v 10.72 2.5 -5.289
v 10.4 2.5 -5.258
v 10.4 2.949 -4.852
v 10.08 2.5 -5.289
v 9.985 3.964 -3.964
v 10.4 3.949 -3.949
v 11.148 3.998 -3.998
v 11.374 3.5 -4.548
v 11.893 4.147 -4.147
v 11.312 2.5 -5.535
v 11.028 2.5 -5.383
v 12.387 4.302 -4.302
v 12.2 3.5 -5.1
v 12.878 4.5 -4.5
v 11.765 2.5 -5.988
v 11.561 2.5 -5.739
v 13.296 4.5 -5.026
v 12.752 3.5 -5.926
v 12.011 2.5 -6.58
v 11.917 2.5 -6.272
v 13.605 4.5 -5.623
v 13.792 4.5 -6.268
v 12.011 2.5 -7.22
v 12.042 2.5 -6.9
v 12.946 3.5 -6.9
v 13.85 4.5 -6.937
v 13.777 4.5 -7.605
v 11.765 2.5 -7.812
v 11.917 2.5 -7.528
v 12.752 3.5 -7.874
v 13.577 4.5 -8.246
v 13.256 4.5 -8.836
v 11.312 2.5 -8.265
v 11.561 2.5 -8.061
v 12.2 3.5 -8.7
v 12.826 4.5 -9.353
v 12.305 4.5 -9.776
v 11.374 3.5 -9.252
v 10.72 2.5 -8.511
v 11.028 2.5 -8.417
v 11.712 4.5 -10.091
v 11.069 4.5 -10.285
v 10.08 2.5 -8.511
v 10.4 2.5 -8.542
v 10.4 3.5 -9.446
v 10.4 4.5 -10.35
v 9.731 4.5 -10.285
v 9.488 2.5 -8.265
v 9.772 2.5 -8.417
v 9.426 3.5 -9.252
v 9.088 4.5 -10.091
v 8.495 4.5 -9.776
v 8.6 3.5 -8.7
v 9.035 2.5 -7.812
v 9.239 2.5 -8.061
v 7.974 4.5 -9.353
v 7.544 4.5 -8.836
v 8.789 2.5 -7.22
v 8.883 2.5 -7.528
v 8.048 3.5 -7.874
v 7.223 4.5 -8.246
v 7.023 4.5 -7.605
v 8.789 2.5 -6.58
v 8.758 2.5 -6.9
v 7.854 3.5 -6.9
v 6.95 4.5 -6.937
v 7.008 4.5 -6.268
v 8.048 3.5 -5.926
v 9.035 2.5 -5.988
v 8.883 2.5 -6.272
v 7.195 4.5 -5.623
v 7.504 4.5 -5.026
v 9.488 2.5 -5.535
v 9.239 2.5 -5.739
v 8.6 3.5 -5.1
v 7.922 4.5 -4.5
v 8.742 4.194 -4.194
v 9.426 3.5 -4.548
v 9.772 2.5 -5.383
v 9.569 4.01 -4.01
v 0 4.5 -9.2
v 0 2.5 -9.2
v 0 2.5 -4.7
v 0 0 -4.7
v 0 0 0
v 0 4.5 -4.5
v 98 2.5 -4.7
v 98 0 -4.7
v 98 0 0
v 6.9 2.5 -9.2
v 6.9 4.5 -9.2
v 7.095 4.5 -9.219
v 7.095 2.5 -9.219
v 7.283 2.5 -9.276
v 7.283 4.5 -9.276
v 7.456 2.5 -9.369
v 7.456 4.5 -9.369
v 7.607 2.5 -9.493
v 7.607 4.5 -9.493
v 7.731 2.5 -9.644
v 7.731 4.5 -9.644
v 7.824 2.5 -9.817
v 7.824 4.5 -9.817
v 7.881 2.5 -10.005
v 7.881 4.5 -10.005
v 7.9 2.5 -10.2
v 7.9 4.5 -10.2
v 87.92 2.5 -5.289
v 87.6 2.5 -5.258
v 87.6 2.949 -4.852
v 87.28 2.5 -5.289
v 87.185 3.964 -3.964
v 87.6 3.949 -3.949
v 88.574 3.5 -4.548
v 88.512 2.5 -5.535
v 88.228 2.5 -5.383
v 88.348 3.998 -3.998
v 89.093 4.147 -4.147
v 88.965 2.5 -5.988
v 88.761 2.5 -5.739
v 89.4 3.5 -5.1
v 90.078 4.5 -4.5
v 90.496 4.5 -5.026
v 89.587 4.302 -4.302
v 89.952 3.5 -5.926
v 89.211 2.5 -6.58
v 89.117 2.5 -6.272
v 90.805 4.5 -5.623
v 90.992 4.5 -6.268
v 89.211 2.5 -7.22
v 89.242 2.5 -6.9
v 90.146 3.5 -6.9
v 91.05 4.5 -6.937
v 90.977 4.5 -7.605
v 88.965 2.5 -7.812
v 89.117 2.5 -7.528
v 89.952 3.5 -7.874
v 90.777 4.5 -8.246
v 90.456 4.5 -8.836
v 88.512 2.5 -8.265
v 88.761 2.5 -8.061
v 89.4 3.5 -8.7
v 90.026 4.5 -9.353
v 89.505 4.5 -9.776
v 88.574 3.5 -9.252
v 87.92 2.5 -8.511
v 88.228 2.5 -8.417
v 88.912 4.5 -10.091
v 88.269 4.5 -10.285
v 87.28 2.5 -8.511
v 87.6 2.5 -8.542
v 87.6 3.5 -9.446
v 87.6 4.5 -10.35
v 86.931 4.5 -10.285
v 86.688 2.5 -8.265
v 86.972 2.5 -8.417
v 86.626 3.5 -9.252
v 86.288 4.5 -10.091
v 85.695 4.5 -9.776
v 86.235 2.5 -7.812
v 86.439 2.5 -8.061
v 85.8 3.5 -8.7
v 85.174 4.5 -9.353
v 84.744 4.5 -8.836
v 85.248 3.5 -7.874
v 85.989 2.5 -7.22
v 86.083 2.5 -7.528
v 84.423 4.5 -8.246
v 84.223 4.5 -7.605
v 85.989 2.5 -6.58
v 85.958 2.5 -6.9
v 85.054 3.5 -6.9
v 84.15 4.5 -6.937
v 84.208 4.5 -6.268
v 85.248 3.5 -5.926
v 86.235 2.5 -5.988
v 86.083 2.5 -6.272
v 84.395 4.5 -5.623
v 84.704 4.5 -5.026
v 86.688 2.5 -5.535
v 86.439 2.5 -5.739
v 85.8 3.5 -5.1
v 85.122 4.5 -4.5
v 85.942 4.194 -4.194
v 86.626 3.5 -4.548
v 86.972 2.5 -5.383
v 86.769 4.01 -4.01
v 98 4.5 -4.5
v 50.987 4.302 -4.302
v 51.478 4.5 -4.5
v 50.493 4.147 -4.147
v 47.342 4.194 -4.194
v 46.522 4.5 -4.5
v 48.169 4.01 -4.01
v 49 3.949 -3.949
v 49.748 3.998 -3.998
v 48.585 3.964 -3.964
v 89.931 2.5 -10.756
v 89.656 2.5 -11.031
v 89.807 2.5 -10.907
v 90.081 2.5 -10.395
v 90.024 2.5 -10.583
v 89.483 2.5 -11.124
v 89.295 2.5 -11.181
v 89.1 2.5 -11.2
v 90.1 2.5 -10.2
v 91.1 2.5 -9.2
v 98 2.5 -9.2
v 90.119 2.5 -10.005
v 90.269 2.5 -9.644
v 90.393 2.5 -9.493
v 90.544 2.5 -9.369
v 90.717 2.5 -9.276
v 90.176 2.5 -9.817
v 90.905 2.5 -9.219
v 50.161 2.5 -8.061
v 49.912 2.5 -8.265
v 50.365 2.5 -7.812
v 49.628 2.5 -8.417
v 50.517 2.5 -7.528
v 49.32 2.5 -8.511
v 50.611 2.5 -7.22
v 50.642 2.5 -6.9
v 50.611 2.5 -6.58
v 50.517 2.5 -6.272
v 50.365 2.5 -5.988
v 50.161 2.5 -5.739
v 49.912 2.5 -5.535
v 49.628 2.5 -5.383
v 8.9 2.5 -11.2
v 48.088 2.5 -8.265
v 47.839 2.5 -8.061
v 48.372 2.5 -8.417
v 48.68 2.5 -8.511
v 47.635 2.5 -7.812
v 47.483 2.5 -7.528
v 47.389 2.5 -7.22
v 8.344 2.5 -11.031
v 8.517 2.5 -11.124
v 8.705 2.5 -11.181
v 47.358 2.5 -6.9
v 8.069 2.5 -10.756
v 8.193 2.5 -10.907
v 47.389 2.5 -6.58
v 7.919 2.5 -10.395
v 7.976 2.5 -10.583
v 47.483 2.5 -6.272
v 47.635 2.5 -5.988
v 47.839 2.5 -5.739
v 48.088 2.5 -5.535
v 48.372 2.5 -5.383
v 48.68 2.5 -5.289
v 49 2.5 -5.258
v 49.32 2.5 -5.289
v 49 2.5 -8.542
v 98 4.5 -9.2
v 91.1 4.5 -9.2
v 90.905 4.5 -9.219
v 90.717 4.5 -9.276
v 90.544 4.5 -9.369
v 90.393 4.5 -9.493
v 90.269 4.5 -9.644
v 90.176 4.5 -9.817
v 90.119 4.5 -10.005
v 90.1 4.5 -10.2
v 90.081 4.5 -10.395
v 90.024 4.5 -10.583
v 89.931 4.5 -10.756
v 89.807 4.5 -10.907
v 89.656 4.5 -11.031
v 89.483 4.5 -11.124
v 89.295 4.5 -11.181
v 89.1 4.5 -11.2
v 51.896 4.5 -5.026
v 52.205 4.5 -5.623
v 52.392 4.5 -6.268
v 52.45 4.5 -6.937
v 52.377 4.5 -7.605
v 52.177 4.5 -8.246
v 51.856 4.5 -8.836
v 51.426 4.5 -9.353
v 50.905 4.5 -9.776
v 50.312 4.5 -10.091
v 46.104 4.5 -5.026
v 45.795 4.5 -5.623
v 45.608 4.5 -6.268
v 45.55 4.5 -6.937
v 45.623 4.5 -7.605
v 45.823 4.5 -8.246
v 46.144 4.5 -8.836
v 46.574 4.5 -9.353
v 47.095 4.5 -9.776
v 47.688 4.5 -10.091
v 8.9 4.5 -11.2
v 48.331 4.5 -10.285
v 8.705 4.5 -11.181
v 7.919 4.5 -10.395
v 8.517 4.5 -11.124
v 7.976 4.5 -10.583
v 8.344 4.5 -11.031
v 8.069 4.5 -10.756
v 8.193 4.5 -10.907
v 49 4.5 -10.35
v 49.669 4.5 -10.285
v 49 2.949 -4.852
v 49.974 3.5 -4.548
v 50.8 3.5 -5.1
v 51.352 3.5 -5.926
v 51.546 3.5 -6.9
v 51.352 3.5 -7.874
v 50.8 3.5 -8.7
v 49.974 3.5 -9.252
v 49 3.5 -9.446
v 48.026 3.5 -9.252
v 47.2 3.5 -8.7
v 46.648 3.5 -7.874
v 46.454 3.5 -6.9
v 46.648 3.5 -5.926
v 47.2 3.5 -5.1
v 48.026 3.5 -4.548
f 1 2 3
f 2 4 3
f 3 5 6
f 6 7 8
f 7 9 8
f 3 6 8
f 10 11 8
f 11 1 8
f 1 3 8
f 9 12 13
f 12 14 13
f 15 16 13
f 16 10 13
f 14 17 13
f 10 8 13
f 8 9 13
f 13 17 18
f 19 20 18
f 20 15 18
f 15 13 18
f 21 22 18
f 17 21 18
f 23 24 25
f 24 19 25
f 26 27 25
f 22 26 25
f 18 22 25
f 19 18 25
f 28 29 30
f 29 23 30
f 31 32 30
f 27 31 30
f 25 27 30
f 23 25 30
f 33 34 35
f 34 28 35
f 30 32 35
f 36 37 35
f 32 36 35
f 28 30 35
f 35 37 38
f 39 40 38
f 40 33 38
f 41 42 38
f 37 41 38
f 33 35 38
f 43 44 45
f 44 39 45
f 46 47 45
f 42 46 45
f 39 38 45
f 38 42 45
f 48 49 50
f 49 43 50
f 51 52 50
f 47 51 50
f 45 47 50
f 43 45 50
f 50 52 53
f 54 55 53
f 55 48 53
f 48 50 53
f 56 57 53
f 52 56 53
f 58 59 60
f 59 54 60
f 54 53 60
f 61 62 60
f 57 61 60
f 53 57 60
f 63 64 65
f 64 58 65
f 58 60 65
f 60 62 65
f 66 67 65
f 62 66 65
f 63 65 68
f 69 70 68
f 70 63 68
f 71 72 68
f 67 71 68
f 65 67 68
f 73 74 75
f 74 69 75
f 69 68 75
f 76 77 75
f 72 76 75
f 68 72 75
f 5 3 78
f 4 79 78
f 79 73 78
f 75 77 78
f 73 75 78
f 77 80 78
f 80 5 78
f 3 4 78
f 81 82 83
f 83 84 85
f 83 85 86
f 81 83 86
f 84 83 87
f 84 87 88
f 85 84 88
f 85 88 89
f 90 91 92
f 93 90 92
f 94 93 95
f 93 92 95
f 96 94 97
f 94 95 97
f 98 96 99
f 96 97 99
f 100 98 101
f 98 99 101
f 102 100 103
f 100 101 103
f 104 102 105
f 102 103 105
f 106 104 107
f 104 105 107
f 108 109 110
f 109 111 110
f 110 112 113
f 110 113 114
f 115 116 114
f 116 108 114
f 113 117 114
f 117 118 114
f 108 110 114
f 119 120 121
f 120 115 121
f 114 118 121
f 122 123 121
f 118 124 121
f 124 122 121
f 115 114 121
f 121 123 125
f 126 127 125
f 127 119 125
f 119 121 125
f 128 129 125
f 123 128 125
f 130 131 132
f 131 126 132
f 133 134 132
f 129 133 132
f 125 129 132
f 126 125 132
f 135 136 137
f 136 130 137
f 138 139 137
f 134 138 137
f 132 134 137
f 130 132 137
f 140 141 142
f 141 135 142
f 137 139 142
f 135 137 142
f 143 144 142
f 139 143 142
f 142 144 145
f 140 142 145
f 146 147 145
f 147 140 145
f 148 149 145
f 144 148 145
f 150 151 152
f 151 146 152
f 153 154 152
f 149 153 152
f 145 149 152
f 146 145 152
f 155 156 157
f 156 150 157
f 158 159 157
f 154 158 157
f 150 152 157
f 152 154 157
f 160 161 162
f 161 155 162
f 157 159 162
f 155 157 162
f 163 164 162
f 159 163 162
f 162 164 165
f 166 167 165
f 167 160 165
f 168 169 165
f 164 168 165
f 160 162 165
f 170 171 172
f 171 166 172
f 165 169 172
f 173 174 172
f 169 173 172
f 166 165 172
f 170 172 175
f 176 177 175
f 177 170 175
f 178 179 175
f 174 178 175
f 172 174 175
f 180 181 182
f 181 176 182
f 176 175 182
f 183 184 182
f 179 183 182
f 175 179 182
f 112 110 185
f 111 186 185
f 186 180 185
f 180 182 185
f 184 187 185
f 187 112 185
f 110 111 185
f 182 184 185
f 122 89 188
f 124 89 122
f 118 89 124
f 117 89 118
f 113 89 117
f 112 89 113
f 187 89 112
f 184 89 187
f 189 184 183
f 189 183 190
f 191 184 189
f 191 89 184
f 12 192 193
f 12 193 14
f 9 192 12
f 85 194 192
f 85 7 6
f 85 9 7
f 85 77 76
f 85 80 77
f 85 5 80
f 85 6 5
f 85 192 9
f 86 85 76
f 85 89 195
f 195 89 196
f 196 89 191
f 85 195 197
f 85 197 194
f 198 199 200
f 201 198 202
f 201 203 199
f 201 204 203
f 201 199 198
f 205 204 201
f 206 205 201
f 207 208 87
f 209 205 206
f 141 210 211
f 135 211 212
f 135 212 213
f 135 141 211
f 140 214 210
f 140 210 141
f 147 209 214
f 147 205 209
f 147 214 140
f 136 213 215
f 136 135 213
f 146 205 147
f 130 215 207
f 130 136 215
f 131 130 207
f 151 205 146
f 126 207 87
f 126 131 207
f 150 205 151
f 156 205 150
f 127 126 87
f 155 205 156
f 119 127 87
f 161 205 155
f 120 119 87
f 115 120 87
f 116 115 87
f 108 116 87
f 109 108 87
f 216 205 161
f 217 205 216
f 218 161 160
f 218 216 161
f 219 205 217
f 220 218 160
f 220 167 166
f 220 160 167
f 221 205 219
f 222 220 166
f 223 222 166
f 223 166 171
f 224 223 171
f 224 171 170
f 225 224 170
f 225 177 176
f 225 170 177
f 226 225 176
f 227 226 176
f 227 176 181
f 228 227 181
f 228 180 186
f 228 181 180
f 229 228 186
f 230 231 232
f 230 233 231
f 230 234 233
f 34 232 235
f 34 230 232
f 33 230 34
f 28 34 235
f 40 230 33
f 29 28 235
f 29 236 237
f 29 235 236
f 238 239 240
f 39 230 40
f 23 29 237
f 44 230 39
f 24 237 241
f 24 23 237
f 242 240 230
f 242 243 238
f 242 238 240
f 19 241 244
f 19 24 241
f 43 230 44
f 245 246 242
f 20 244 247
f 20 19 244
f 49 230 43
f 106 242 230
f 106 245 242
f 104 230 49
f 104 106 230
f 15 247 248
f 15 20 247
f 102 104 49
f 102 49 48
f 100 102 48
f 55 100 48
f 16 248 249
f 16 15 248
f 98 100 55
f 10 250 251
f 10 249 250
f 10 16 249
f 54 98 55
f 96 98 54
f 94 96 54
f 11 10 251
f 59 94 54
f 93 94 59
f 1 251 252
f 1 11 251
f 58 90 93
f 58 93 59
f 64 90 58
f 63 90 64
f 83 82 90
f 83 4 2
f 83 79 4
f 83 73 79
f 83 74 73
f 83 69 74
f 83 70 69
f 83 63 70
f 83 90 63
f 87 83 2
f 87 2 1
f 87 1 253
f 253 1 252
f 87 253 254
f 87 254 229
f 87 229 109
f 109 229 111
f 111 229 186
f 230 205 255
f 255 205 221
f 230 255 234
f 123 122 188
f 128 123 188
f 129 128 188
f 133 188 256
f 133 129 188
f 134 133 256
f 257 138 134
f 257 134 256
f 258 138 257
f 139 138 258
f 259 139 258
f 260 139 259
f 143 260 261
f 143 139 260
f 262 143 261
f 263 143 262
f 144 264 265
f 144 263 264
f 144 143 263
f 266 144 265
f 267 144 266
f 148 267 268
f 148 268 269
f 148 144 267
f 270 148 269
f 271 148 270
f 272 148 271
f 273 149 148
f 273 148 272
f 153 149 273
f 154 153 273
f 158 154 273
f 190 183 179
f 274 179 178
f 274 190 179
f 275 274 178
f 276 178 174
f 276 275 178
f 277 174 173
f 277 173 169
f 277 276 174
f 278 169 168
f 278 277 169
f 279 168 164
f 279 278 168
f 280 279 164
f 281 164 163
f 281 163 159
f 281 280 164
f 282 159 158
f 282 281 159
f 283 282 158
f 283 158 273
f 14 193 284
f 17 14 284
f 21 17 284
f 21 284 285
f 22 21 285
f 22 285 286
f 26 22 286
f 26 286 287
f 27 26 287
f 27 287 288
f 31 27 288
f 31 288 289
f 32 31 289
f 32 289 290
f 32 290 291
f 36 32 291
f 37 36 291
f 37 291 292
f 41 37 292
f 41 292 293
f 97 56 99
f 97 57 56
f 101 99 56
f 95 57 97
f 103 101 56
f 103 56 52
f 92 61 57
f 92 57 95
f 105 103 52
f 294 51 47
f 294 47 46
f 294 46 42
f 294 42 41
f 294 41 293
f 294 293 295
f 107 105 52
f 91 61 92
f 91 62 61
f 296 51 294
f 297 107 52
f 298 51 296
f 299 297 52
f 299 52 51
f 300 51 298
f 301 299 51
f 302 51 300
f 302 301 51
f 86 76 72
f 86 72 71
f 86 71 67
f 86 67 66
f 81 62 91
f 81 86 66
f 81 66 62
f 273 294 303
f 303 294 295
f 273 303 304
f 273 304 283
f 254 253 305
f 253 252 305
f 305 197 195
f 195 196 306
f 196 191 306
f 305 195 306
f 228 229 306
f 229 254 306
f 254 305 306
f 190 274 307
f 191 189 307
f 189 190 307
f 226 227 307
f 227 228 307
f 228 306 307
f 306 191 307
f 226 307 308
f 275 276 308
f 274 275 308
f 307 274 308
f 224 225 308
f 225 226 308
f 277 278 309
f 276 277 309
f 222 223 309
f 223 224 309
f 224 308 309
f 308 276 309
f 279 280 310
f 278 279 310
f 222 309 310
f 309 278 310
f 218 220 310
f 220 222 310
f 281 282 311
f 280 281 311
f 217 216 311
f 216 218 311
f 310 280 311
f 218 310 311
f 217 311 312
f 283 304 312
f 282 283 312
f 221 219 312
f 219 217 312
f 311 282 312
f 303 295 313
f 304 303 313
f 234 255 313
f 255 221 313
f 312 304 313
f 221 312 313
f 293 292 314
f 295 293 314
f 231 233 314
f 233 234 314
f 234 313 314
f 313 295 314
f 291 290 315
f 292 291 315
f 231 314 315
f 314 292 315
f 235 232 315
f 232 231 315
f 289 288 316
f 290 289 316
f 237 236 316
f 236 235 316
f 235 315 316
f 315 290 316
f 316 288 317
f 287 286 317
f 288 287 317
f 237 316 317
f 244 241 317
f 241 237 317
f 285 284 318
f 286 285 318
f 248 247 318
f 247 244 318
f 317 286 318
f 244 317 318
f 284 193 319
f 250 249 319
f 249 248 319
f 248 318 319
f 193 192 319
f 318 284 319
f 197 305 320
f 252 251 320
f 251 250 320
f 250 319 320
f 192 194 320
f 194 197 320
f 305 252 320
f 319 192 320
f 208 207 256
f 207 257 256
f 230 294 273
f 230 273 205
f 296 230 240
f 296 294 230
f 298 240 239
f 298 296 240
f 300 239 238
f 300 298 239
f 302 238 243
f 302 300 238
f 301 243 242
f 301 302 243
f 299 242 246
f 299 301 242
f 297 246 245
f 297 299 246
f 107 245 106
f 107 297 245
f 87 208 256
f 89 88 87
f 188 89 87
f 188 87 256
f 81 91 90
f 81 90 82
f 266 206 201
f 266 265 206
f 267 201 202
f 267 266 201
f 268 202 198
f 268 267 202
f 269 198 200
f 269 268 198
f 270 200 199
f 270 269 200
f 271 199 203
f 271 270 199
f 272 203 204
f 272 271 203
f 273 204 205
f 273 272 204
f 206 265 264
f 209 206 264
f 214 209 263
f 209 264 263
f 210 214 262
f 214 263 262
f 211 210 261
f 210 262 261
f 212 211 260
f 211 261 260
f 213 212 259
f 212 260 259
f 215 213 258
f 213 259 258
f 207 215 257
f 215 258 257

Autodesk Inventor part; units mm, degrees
ref_plane "YZ Plane" through (0, 0, 0) normal (1, 0, 0) x (0, 1, 0)
ref_plane "XZ Plane" through (0, 0, 0) normal (0, 1, 0) x (-1, 0, 0)
ref_plane "XY Plane" through (0, 0, 0) normal (0, 0, 1) x (1, 0, 0)
sketch "Szkic1" plane through (0, 0, 0) normal (1, 0, 0) x (0, 1, 0)
  line L0 (0, 0) -> (4.5, -4.5)
  line L1 (4.5, -4.5) -> (4.5, -11.2)
  line L2 (4.5, -11.2) -> (2.5, -11.2)
  line L3 (2.5, -11.2) -> (2.5, -4.7)
  line L4 (2.5, -4.7) -> (0, -4.7)
  line L5 (0, -4.7) -> (0, 0)
  line L6 (2.5, -4.7) -> (2.5, -2.5) construction
  dimension "d0" = 11.2
  dimension "d1" = 4.5
  dimension "d2" = 45
  dimension "d3" = 2.5
  dimension "d4" = 6.5
extrude "Wyciągnięcie proste1" add sketch "Szkic1" along normal blind 98
sketch "Szkic2" plane through (0, 4.5, -4.5) normal (0, 1, 0) x (1, 0, 0)
  line L0 (0, 6.7) -> (0, 0.2) projected
  line L1 (0, 6.7) -> (7.9, 6.7)
  line L2 (7.9, 6.7) -> (7.9, 4.7)
  line L3 (7.9, 4.7) -> (0, 4.7)
  line L4 (0, 4.7) -> (0, 6.7)
  line L5 (0, 0.2) -> (98, 0.2) construction
  line L6 (49, 0.2) -> (49, 6.7) construction
  line L7 (0, 6.7) -> (98, 6.7) construction
  line L8 (98, 6.7) -> (90.1, 6.7)
  line L9 (90.1, 6.7) -> (90.1, 4.7)
  line L10 (90.1, 4.7) -> (98, 4.7)
  line L11 (98, 4.7) -> (98, 6.7)
  point P0 (0, -4.5)
  dimension "d7" = 7.9
  dimension "d8" = 2
extrude "Wyciągnięcie proste2" cut sketch "Szkic2" against normal through all
sketch "Szkic3" plane through (0, 4.5, -4.5) normal (0, 1, 0) x (1, 0, 0)
  line L0 (0, -4.5) -> (98, -4.5) construction
  line L1 (49, -4.5) -> (49, 6.7) construction
  line L2 (7.9, 6.7) -> (90.1, 6.7) construction
  line L3 (98, 4.7) -> (98, 0) construction
  point P0 (87.6, 2.4)
  point P1 (49, 2.4)
  point P2 (10.4, 2.4)
  point P3 (98, 0.2)
  dimension "d11" = 10.4
  dimension "d21" = 2.2
hole "Otwór1" at (87.6, 4.5, -6.9) at (49, 4.5, -6.9) at (10.4, 4.5, -6.9) direction (0, -1, 0) diameter 3.2 end through all countersink diameter 6.9 countersink angle 84.225 clearance for "Śruba ze łbem stożkowym ISO 2009/7046" size "M3" standard "ISO"
fillet "Zaokrąglenie1" radius 1 4 edges at (90.1, 3.4707, -9.2) (90.1, 3.5, -11.2) (7.9, 3.4707, -9.2) (7.9, 3.5, -11.2)
properties part number "Plog2" material "Stal"
